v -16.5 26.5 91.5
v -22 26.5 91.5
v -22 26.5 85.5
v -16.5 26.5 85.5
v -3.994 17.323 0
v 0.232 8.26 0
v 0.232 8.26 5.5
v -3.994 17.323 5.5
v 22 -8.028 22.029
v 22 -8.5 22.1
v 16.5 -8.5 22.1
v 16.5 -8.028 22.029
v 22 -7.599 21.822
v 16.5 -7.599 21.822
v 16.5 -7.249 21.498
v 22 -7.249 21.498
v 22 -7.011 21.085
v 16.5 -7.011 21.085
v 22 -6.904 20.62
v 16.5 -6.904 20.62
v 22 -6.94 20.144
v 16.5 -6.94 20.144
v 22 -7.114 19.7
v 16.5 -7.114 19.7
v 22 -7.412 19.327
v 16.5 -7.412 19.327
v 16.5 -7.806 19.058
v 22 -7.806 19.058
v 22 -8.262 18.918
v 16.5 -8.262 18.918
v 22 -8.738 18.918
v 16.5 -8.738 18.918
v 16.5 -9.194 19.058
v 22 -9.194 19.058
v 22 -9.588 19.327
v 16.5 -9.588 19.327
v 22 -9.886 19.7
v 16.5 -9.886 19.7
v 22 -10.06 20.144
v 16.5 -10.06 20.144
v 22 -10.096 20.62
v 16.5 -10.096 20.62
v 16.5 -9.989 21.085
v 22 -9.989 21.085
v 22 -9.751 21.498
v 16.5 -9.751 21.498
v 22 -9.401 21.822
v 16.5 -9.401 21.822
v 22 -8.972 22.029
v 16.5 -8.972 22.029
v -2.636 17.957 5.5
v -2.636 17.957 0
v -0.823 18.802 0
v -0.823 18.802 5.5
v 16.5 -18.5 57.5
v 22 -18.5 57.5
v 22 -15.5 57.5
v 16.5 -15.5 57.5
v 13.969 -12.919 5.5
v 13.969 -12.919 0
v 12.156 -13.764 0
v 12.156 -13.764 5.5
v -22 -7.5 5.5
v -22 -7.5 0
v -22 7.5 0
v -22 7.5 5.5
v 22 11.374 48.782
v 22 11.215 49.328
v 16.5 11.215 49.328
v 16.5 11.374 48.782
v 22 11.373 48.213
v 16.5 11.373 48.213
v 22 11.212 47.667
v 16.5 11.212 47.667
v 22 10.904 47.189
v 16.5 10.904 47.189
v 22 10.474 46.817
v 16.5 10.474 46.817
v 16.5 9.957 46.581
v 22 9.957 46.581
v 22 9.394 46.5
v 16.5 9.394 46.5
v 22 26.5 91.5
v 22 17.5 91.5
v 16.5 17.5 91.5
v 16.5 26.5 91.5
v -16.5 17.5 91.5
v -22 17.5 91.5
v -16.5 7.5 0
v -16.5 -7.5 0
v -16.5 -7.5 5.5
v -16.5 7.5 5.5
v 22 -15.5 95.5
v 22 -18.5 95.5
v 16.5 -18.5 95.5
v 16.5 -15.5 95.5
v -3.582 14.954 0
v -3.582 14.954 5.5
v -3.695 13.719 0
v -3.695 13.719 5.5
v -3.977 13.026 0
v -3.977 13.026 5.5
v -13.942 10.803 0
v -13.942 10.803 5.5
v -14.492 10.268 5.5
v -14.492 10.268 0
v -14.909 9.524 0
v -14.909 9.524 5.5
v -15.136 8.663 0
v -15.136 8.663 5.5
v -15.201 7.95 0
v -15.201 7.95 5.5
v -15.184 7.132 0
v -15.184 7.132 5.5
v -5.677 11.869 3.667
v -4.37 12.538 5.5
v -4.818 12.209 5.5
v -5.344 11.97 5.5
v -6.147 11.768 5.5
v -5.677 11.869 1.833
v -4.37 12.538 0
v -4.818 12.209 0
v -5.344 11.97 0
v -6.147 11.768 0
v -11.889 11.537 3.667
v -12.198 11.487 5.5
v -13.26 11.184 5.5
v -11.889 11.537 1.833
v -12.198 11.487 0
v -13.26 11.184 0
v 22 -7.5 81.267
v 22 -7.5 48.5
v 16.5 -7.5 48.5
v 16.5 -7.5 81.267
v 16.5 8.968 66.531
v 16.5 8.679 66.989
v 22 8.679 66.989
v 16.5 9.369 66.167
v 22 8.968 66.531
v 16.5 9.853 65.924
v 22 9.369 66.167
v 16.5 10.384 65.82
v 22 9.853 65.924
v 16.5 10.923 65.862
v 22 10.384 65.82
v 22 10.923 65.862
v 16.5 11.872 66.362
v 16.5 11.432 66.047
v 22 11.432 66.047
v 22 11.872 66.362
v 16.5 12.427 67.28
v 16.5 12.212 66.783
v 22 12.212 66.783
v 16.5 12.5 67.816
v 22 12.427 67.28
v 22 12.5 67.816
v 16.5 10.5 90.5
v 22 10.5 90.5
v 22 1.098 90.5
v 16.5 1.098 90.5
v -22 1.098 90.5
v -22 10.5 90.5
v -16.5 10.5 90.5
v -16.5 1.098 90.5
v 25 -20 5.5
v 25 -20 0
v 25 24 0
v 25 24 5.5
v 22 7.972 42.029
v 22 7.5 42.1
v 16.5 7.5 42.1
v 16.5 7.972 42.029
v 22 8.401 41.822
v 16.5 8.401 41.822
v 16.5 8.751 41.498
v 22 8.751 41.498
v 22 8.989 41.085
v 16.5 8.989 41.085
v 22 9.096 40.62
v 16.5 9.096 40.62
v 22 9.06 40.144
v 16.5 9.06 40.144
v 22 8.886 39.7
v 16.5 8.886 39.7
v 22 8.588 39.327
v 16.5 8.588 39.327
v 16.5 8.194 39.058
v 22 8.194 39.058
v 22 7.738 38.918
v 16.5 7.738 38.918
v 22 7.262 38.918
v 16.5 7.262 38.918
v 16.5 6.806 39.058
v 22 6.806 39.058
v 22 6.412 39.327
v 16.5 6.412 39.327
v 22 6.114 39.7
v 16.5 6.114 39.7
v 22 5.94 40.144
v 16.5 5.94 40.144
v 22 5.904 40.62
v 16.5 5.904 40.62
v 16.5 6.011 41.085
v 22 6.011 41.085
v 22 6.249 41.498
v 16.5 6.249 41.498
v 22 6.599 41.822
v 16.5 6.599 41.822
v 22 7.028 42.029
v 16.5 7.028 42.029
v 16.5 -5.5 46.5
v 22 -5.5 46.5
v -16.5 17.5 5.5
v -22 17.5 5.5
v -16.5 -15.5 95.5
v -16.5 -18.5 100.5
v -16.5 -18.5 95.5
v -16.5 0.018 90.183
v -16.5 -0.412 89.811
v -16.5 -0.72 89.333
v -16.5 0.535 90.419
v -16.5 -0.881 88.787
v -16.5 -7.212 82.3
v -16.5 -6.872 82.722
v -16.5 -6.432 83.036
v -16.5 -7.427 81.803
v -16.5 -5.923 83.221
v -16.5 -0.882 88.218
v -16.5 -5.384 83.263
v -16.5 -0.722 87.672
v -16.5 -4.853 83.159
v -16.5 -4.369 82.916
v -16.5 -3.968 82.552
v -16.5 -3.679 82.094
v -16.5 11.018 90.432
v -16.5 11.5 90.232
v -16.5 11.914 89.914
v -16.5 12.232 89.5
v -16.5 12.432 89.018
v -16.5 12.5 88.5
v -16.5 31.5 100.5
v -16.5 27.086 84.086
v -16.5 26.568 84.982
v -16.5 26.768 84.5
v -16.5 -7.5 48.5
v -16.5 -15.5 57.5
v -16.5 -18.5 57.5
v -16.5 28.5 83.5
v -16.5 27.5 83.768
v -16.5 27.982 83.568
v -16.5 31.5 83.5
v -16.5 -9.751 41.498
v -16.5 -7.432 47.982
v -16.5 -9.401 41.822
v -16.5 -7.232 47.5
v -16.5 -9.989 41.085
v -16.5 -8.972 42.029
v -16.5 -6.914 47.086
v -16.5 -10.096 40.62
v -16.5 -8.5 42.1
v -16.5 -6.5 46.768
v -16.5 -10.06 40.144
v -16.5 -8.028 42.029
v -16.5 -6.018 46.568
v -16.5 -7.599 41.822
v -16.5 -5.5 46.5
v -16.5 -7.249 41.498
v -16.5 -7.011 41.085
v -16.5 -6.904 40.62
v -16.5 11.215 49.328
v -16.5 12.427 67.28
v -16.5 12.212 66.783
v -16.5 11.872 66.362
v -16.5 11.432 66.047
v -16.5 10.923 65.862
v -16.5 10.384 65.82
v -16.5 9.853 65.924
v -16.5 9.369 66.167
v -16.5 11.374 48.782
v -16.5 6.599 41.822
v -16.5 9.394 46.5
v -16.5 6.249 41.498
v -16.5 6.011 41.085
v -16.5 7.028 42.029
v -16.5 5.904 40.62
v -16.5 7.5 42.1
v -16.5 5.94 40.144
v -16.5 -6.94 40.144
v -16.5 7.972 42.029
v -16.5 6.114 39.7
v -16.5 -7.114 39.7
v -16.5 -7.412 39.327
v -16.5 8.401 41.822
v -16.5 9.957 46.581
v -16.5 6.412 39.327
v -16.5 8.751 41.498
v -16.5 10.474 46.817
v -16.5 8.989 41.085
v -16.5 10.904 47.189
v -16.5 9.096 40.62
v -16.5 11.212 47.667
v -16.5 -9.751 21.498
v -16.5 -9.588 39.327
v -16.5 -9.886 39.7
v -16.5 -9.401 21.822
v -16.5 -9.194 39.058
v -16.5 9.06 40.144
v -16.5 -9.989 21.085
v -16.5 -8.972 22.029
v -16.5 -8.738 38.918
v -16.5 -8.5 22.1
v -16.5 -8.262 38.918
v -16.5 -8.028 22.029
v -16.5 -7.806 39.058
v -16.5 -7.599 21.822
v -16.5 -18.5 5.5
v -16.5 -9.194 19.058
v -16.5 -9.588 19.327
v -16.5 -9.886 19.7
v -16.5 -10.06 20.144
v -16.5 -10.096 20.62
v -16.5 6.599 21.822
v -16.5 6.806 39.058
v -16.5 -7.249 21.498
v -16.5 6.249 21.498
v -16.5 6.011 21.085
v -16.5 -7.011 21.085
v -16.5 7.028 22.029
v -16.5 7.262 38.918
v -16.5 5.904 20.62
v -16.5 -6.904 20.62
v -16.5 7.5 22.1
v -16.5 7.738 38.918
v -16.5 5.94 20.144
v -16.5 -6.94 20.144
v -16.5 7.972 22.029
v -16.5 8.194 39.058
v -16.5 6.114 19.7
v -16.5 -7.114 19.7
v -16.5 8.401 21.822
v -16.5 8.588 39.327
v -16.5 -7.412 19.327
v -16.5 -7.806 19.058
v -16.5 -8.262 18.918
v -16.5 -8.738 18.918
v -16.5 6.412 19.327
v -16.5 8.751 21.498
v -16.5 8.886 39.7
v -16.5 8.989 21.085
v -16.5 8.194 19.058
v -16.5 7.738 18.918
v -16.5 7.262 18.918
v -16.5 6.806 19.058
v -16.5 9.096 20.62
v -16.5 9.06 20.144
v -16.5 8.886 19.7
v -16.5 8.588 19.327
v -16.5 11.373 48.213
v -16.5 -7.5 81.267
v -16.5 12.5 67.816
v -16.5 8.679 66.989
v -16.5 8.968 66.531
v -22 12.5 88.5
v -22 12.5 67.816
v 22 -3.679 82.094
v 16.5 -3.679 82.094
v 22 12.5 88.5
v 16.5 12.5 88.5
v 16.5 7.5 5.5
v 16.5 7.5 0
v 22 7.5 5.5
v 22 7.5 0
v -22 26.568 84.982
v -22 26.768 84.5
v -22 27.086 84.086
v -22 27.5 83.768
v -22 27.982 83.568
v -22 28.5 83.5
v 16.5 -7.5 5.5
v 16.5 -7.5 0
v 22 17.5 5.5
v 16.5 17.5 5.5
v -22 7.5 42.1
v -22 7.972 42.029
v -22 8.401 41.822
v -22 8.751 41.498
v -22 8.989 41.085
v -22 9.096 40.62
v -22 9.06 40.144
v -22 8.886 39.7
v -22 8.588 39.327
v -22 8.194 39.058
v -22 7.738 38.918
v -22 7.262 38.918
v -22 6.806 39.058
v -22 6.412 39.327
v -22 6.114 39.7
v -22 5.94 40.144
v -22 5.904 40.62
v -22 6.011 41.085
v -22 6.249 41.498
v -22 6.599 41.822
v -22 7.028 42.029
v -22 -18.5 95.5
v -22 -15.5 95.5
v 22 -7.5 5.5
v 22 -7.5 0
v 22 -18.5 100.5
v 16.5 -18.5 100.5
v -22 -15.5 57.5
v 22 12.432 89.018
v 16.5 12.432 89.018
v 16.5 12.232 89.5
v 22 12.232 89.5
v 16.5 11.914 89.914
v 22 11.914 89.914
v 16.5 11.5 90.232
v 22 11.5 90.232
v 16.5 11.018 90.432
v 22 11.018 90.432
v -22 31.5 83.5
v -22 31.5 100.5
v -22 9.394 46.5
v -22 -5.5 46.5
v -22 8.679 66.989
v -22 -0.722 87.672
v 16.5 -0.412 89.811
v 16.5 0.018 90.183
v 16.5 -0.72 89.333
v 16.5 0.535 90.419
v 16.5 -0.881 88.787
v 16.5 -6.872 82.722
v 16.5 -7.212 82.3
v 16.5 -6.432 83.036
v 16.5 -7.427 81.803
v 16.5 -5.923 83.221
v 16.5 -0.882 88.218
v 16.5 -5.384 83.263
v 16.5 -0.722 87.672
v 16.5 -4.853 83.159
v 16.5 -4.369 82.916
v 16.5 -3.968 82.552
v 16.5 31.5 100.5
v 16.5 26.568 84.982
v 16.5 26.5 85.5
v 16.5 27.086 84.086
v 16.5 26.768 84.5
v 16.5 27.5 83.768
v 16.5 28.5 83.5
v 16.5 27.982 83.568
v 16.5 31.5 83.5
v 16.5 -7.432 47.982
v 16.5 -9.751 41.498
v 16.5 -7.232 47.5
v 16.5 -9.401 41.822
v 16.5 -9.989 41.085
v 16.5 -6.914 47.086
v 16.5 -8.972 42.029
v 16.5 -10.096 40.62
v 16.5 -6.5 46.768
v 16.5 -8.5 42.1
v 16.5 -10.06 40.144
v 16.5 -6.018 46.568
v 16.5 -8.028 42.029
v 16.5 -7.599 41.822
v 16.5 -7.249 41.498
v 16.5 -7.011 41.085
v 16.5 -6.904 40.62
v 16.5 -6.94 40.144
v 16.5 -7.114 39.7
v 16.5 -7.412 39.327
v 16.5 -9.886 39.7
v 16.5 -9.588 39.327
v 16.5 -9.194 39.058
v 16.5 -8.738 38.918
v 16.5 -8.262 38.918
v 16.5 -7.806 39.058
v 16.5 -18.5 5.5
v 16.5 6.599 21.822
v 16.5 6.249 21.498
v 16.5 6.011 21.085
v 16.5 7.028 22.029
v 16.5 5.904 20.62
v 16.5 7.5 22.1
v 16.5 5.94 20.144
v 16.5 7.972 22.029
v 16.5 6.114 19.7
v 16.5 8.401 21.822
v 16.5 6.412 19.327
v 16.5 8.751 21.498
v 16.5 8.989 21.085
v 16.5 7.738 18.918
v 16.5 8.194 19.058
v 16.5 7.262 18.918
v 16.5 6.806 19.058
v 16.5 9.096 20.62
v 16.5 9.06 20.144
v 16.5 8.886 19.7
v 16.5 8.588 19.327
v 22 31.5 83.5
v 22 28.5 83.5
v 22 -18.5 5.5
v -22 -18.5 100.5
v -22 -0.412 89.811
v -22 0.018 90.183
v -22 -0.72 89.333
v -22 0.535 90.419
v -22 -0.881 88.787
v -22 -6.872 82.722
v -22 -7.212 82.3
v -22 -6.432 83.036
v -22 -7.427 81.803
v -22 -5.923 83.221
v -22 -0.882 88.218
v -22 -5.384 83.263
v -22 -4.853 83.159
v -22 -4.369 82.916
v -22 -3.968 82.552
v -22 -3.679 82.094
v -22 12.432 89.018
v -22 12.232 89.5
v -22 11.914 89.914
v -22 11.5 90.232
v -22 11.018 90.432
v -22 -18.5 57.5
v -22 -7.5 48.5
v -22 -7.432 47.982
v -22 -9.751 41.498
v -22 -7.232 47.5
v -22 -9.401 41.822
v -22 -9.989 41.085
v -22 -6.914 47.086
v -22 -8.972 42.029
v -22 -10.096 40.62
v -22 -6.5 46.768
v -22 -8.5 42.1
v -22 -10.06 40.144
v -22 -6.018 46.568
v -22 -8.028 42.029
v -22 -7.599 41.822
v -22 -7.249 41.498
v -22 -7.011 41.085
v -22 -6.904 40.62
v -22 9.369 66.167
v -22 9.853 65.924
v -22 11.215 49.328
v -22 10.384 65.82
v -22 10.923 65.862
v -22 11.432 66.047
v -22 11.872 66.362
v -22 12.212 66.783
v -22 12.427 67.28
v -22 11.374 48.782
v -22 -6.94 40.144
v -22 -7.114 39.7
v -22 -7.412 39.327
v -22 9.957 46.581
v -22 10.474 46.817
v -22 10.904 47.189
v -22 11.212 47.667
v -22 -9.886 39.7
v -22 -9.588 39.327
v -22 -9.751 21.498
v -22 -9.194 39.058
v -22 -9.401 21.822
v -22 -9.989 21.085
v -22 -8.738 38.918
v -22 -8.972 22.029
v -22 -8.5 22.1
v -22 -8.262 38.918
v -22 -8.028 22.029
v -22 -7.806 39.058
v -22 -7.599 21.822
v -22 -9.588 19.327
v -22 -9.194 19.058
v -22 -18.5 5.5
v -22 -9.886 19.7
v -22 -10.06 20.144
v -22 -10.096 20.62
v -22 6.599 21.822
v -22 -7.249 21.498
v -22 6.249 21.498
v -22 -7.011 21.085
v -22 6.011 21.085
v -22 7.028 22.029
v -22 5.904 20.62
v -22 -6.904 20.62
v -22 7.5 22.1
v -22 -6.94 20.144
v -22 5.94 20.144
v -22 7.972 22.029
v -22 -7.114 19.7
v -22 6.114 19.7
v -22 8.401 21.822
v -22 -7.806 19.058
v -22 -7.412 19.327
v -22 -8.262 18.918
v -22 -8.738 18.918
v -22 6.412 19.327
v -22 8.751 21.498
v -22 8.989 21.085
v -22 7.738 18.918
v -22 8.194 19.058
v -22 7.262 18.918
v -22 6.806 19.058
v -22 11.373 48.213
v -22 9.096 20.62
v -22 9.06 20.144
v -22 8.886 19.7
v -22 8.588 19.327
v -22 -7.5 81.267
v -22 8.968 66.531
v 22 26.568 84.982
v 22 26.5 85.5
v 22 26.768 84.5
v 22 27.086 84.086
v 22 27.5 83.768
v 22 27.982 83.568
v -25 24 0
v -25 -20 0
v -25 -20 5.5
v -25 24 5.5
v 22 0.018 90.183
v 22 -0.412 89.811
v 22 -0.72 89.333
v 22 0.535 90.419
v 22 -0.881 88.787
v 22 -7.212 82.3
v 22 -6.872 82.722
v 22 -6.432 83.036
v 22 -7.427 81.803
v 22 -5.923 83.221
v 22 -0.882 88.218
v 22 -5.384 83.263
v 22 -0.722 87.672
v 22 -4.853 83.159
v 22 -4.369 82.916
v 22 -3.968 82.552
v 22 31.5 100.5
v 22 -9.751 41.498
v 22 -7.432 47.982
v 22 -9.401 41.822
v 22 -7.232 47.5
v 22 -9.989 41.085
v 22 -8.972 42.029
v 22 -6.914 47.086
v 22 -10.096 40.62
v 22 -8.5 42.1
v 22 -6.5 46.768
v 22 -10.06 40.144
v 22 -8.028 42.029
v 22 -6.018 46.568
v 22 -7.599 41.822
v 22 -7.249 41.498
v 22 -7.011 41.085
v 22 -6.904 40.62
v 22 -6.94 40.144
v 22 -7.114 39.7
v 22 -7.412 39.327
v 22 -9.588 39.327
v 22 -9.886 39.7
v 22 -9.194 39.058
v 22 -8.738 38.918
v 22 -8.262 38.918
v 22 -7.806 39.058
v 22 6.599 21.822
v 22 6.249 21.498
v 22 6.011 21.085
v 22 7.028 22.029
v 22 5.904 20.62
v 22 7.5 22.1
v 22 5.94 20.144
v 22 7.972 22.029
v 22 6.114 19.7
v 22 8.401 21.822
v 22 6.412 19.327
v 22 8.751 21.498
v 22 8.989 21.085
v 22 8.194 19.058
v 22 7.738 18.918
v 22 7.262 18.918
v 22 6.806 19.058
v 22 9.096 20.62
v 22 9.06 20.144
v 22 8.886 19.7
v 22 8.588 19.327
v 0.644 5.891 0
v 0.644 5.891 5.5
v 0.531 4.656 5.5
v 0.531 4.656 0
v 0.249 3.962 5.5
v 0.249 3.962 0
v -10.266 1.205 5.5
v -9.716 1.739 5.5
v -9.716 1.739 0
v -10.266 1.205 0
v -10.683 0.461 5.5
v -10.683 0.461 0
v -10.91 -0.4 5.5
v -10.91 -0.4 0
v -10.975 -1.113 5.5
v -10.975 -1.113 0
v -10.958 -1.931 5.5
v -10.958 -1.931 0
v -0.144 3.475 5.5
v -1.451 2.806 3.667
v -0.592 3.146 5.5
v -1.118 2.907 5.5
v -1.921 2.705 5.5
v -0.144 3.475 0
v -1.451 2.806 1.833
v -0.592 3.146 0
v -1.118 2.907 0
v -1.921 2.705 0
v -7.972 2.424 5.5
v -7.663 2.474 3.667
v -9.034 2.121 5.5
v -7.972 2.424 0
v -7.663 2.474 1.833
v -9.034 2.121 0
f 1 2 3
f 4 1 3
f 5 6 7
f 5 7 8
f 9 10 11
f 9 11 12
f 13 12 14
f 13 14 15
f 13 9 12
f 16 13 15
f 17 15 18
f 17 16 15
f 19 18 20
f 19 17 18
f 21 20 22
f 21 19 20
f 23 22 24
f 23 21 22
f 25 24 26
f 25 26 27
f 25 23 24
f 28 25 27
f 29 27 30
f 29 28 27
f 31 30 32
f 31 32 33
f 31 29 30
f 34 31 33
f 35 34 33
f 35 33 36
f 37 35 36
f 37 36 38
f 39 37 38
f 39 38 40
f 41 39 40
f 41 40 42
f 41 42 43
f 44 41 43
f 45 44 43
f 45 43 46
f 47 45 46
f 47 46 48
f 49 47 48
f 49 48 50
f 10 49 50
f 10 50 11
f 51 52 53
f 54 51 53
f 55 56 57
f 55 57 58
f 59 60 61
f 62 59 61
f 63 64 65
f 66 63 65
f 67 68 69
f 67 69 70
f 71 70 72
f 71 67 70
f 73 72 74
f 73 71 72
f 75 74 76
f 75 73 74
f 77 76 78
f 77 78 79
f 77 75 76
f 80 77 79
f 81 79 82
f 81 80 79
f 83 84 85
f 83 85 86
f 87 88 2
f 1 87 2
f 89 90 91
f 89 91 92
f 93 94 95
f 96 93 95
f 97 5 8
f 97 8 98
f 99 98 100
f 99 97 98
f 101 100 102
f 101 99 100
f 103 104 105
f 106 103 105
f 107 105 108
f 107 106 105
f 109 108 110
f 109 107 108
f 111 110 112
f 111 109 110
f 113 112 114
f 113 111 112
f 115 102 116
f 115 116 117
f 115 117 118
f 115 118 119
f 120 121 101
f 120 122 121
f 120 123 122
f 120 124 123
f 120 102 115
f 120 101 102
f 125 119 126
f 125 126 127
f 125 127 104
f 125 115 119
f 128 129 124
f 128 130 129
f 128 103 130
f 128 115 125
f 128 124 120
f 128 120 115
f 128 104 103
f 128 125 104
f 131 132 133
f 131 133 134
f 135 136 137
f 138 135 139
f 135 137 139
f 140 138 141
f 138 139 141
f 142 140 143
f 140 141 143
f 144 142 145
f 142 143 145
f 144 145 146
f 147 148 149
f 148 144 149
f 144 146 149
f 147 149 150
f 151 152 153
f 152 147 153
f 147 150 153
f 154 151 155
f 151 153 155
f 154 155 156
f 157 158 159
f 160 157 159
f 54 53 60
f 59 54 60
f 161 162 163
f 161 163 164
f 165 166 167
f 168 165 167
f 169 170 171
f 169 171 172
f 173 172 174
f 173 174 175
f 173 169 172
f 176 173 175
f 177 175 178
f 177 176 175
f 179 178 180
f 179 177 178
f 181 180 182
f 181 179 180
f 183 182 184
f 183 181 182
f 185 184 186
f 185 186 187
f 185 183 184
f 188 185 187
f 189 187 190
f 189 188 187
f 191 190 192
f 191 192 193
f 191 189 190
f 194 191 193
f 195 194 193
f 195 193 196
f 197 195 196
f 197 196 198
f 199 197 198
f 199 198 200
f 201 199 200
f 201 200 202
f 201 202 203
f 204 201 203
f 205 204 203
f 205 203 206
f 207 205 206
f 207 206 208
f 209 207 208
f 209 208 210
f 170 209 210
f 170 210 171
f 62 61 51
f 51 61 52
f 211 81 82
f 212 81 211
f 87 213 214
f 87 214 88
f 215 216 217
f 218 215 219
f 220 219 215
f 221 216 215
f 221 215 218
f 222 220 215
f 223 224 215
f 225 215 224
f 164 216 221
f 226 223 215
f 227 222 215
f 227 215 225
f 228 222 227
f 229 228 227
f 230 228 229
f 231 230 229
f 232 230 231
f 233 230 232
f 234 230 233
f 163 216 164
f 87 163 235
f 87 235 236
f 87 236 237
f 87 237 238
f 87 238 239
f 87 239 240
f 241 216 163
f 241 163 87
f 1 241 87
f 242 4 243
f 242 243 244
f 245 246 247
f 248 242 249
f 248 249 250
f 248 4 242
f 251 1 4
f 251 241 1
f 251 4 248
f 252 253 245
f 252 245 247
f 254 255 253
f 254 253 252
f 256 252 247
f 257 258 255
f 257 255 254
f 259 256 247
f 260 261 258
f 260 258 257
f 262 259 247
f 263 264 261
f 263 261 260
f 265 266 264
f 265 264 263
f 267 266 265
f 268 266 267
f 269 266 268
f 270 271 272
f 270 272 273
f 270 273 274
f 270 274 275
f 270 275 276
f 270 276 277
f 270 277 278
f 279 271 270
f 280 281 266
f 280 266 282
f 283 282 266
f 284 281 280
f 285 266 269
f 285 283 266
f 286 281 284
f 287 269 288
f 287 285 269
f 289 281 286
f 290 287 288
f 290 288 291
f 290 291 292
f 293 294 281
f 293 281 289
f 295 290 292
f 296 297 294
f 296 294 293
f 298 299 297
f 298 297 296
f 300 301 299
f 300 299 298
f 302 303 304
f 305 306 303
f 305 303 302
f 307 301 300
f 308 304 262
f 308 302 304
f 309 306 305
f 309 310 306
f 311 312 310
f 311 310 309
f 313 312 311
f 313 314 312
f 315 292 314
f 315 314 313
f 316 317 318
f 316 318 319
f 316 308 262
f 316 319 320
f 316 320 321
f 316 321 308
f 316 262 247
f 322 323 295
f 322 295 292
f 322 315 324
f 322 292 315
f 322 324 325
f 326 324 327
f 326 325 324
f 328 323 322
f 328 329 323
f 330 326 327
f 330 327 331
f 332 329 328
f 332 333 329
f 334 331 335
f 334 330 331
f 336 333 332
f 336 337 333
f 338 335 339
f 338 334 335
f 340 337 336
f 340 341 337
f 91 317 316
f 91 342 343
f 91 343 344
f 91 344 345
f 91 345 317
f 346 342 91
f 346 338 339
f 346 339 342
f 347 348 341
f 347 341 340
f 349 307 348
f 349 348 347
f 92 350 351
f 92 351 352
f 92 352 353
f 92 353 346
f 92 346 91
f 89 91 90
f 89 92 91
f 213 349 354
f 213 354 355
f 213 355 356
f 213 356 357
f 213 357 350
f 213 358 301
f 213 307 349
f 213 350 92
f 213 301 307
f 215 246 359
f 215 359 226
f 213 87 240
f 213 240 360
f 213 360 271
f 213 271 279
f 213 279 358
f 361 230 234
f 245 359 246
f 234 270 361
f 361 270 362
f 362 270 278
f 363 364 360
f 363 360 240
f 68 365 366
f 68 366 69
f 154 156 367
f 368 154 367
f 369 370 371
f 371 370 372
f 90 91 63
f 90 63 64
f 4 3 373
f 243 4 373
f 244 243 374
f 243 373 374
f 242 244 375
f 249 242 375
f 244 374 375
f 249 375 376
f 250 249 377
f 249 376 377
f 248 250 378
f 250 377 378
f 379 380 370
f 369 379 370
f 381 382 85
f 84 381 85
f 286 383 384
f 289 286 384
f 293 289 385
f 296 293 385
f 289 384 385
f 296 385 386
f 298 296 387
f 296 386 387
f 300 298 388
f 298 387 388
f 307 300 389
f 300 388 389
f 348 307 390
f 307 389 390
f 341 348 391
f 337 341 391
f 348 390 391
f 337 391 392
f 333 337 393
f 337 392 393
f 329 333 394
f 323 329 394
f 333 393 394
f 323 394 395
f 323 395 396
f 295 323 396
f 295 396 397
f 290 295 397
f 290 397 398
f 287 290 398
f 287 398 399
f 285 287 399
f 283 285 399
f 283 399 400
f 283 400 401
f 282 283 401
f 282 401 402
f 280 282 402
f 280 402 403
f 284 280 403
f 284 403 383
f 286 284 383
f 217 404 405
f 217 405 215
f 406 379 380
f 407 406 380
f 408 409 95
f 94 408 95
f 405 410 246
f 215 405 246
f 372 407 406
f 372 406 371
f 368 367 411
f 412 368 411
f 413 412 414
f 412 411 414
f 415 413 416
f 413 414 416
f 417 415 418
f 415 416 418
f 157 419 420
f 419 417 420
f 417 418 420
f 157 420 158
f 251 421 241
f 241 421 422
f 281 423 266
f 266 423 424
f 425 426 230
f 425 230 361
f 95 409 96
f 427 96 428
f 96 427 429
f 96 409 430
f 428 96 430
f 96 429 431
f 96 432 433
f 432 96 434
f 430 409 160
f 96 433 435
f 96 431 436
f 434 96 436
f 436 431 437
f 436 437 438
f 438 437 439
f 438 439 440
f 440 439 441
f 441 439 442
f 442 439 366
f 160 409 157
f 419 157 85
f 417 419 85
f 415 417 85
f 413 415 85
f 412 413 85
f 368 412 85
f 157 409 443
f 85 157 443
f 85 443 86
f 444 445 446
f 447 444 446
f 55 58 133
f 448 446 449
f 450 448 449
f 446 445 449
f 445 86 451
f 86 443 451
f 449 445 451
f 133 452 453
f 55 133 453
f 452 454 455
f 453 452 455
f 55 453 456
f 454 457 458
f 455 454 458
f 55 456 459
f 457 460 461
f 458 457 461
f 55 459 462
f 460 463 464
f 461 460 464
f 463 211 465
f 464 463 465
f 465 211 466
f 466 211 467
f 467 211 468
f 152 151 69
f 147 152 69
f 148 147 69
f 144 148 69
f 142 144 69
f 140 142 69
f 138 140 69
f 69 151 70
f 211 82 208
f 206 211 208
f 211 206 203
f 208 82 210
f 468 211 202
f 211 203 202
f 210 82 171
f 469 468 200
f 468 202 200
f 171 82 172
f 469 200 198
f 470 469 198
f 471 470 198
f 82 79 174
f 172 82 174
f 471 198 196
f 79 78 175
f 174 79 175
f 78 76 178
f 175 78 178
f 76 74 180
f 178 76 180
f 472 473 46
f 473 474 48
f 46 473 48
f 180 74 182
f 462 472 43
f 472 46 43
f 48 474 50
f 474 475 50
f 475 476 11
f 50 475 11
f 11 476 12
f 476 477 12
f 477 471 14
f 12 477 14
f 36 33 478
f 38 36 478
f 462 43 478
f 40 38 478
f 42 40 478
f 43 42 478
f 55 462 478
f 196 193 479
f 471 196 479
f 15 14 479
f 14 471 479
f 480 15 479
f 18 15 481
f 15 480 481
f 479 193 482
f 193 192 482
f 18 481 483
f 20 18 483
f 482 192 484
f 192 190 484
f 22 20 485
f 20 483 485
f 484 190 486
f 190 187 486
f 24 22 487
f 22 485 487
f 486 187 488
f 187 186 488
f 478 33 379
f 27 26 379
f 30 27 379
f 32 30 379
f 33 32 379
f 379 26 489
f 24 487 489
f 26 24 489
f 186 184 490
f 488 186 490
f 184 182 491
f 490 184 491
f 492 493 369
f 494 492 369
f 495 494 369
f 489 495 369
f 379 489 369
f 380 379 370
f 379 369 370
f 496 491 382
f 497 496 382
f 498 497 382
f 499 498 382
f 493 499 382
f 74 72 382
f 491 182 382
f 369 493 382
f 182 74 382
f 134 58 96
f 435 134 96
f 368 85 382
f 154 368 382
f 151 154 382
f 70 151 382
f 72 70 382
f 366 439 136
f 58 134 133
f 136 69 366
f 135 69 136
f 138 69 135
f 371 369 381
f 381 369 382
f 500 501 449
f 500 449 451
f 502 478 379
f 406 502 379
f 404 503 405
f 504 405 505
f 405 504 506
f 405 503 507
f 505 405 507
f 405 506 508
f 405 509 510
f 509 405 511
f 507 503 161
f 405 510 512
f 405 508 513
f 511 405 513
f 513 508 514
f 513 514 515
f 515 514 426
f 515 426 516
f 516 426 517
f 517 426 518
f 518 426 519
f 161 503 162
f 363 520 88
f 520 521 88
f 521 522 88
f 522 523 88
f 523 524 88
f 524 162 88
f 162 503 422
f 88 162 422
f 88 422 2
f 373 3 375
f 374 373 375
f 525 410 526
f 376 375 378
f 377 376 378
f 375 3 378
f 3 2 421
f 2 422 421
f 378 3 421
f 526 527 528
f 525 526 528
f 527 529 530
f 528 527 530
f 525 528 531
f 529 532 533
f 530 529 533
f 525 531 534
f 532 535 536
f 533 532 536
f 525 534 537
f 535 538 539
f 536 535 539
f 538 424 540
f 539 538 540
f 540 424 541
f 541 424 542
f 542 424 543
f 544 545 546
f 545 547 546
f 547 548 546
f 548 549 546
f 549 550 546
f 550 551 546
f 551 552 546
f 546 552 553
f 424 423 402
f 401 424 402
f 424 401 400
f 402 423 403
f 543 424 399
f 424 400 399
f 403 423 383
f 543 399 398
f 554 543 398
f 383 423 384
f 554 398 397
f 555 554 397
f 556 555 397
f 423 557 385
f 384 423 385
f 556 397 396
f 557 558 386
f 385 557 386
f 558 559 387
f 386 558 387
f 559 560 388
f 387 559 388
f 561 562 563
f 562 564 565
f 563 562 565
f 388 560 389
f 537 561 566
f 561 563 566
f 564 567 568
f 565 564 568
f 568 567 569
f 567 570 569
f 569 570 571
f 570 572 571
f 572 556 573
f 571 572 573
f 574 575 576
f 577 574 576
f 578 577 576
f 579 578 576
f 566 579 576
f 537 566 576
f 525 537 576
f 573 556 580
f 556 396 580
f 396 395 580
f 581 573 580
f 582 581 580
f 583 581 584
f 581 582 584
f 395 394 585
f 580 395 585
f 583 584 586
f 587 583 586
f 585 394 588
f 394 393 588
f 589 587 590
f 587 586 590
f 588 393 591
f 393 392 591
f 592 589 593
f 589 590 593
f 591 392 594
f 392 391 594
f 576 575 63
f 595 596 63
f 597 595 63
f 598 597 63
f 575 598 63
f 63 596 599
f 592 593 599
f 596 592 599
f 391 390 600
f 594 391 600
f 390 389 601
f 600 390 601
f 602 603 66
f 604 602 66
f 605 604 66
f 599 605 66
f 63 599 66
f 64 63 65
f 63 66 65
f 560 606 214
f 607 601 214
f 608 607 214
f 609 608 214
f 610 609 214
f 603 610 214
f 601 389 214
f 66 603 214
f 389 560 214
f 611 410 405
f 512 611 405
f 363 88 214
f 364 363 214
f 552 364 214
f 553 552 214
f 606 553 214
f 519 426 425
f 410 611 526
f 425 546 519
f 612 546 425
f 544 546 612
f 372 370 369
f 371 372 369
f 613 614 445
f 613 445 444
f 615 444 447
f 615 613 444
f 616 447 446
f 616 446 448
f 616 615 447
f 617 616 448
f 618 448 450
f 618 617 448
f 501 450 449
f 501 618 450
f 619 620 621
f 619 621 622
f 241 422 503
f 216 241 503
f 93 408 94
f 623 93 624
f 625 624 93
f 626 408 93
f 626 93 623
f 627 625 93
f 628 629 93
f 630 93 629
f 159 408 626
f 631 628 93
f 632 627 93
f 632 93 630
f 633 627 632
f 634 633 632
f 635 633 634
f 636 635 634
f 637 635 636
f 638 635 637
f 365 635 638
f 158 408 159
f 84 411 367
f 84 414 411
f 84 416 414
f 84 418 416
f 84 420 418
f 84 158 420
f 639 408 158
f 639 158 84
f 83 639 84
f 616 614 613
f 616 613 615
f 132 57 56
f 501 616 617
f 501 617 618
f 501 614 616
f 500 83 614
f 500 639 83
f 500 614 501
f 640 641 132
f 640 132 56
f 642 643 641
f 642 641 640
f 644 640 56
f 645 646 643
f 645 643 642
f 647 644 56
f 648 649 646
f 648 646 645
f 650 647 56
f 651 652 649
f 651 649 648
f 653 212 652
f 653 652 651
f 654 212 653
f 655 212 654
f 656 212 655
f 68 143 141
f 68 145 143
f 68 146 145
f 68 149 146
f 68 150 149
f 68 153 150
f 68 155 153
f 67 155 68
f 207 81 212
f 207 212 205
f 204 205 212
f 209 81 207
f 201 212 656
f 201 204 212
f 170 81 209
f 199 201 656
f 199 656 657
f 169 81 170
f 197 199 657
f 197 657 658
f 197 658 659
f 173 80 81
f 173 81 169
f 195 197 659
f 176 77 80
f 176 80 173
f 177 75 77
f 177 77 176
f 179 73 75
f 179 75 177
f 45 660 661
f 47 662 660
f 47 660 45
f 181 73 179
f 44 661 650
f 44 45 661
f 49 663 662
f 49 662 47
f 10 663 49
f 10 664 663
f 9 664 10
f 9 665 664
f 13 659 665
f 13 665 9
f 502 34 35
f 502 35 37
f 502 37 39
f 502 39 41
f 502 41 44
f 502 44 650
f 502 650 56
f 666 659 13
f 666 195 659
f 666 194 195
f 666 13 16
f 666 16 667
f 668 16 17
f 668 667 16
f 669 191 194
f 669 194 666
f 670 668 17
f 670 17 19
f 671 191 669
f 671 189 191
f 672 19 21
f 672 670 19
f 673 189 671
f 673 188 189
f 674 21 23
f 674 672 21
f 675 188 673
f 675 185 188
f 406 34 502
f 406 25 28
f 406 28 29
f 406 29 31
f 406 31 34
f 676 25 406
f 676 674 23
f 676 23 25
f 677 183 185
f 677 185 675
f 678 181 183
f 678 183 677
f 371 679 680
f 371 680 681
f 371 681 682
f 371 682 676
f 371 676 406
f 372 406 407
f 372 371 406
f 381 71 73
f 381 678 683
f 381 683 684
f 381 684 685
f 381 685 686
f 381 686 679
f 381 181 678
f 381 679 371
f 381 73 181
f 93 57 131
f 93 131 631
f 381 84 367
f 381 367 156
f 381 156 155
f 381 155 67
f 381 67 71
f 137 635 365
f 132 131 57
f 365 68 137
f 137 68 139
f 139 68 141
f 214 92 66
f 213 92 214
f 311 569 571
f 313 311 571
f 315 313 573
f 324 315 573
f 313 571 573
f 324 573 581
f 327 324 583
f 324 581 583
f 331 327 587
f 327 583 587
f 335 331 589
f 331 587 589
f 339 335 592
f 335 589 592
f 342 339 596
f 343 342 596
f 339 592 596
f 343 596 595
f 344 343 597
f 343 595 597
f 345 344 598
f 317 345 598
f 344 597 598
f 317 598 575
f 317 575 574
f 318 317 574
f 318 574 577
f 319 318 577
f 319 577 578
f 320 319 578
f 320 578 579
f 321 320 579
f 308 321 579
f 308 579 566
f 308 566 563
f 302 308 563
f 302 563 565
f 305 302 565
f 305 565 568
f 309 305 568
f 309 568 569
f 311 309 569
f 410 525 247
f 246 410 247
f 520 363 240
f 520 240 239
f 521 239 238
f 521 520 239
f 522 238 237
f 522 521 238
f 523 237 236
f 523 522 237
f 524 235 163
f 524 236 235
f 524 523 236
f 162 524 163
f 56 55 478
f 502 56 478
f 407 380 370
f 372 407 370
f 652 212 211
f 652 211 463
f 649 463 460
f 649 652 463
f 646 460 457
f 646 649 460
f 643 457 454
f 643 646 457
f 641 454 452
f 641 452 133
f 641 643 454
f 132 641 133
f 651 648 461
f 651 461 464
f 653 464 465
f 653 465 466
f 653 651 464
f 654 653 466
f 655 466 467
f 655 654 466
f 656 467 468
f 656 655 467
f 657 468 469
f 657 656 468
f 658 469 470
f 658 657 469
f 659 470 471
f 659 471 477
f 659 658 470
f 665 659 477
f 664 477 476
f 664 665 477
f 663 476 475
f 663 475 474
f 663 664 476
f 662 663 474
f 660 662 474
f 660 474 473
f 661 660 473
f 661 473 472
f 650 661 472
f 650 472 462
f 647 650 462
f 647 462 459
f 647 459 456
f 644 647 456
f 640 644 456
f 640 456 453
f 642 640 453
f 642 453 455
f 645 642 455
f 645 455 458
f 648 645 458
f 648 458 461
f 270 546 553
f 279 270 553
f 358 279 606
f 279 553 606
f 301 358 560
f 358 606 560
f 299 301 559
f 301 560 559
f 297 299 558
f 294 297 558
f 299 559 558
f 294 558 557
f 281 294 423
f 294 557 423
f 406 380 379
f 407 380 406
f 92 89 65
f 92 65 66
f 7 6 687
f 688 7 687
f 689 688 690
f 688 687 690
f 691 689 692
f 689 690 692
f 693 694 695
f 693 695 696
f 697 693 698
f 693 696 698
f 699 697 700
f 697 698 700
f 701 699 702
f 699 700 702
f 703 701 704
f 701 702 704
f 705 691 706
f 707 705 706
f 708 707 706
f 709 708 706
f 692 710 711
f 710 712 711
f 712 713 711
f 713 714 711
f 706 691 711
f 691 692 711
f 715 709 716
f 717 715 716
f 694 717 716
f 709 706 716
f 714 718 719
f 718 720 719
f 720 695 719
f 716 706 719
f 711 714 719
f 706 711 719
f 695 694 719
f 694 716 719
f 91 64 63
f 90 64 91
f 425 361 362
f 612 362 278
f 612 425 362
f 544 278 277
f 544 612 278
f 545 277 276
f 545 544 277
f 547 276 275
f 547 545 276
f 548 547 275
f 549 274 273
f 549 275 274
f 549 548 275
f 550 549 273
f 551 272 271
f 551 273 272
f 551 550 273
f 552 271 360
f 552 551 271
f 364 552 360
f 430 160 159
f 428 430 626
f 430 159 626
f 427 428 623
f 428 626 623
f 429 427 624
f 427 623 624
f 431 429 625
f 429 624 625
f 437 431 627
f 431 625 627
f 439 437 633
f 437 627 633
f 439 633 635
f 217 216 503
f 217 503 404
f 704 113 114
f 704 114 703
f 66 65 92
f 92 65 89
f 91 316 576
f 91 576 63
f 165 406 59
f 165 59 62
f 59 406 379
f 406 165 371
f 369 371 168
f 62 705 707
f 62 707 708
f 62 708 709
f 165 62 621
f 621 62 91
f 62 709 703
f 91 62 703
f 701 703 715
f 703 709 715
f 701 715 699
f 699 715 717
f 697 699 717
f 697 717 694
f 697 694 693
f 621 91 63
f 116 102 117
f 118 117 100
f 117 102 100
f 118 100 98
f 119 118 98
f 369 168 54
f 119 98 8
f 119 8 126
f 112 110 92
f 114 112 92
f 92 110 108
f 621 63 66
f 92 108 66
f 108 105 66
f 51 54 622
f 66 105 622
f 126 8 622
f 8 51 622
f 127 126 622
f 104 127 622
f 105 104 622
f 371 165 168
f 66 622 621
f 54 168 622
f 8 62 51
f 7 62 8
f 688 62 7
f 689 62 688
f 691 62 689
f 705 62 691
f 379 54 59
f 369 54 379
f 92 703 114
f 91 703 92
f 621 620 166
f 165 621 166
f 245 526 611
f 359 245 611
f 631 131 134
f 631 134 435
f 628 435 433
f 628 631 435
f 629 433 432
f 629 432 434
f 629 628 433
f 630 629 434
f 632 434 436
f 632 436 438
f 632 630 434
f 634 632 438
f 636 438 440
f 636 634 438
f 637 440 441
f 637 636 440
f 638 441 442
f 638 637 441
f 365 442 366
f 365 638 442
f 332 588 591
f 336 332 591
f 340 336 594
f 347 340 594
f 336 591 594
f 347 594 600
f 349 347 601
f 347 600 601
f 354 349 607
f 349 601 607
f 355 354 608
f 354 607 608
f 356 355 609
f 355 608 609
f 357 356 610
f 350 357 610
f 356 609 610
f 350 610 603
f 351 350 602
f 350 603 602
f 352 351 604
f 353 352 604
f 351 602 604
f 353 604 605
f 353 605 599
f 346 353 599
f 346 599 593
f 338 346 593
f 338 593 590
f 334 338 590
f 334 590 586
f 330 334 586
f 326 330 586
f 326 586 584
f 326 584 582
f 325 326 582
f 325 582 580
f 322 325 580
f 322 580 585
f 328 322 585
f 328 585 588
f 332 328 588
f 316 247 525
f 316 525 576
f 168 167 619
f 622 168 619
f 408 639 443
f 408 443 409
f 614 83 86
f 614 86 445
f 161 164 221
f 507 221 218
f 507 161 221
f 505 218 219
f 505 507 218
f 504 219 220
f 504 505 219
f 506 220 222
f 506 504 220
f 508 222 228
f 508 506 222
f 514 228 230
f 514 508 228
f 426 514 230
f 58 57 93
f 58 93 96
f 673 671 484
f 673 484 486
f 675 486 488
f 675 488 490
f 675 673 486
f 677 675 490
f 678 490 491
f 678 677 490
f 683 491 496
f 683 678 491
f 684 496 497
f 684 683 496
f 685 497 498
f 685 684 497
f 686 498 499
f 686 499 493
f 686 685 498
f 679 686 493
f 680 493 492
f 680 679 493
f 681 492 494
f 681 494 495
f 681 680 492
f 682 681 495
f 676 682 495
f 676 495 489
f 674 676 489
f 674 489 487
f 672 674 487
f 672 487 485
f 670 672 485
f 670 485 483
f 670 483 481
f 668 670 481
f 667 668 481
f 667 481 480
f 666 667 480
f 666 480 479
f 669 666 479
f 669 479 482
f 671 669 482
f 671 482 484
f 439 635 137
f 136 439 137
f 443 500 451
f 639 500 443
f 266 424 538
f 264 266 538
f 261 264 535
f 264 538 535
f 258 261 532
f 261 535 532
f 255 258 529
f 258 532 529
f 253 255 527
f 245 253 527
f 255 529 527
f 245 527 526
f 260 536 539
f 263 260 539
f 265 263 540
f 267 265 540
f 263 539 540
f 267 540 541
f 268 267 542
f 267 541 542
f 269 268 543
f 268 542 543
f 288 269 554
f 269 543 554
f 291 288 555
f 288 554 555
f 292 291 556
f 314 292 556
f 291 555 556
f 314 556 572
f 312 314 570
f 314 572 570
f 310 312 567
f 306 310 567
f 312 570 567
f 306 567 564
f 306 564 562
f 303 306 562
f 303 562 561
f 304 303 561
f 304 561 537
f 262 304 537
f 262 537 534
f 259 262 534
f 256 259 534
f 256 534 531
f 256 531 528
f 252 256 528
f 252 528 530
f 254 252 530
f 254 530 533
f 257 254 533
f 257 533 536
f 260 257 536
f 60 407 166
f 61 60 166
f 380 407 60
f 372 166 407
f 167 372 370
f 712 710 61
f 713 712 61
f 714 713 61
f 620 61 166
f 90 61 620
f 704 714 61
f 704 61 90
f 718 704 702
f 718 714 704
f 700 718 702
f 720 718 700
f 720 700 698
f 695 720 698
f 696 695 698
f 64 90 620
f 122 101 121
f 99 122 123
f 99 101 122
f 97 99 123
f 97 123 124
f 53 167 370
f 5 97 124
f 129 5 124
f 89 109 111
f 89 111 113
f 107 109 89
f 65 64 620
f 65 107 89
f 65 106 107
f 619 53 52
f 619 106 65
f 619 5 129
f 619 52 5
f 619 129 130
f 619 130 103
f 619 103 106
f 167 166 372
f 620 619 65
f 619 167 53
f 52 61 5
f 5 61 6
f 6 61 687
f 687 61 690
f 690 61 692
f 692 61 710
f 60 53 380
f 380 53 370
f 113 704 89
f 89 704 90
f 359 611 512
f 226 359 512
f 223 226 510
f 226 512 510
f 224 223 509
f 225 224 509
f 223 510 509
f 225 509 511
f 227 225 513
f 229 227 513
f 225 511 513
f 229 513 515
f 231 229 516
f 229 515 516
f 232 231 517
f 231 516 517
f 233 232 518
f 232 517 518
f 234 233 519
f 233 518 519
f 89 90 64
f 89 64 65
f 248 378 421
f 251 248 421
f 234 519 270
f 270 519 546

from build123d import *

# Parameters (mm, degrees)
SKETCH_1_W          = 50
SKETCH_1_H          = 40
SKETCH_1_W_2        = 5.5
SKETCH_1_H_2        = 15
EXTRUDE_1_DEPTH     = 5.5
EXTRUDE_2_DEPTH     = 5.5
SKETCH_8_W          = 5.5
SKETCH_8_H          = 38
CUT_EXTRUDE_2_DEPTH = 3
SKETCH_19_R         = 1.6
CUT_EXTRUDE_6_DEPTH = 48.0000001
EXTRUDE_3_DEPTH     = 5.5
SKETCH_21_W         = 50
SKETCH_21_H         = 4
EXTRUDE_4_DEPTH     = 5.5


with BuildPart() as part:
    # ｽｹｯﾁ1 → ﾎﾞｽ - 押し出し1 (new body)
    with BuildSketch(Plane.XY):
        Rectangle(SKETCH_1_W, SKETCH_1_H)
        with Locations((-19.25, 0)):
            Rectangle(SKETCH_1_W_2, SKETCH_1_H_2, mode=Mode.SUBTRACT)
        with Locations((19.25, 0)):
            Rectangle(SKETCH_1_W_2, SKETCH_1_H_2, mode=Mode.SUBTRACT)
        with BuildLine():
            Line((-15.184159493, 7.131957878), (-10.957976876, -1.931119992))
            add(Edge.make_bspline(
                [(0.232480079, 8.26018902), (3.294805184, -2.820777733), (-11.603430093, 7.575468843), (-10.957976876, -1.931119992)],
                knots=[0, 0, 0, 0, 1, 1, 1, 1], degree=3))
            Line((0.232480079, 8.26018902), (-3.993702538, 17.323266891))
            add(Edge.make_bspline(
                [(-3.993702538, 17.323266891), (-0.931377433, 6.242300138), (-15.829612711, 16.638546714), (-15.184159493, 7.131957878)],
                knots=[0, 0, 0, 0, 1, 1, 1, 1], degree=3))
        make_face(mode=Mode.SUBTRACT)
        Polygon((-2.635695691, 17.956515883), (-0.823080117, 18.801752407), (13.968559044, -12.91902014), (12.155943469, -13.764256663), align=None, mode=Mode.SUBTRACT)
    extrude(amount=EXTRUDE_1_DEPTH)

    # ｽｹｯﾁ21 → ﾎﾞｽ - 押し出し4 (add)
    with BuildSketch(Plane(origin=(0, 0, 0), x_dir=(-1, 0, 0), z_dir=(0, 0, -1))):
        with Locations((0, 22)):
            Rectangle(SKETCH_21_W, SKETCH_21_H)
    extrude(amount=-EXTRUDE_4_DEPTH)


with BuildPart() as body_2:
    # ｽｹｯﾁ2 → ﾎﾞｽ - 押し出し2 (new body)
    with BuildSketch(Plane.ZY.offset(16.5)):
        Polygon((0, 7.5), (5.5, 7.5), (5.5, 17.5), (100.5, 17.5), (100.5, -18.5), (5.5, -18.5), (5.5, -7.5), (0, -7.5), align=None)
    extrude(amount=EXTRUDE_2_DEPTH)

    # ｽｹｯﾁ8 → ｶｯﾄ - 押し出し2 (cut)
    with BuildSketch(Plane.XZ.offset(18.5)):
        with Locations((-19.25, 76.5)):
            Rectangle(SKETCH_8_W, SKETCH_8_H)
    extrude(amount=-CUT_EXTRUDE_2_DEPTH, mode=Mode.SUBTRACT)

    # ｽｹｯﾁ19 → ｶｯﾄ - 押し出し6 (cut, through all)
    with BuildSketch(Plane.ZY.offset(22)):
        with Locations((20.5, 7.5)):
            Circle(SKETCH_19_R)
        with Locations((20.5, -8.5)):
            Circle(SKETCH_19_R)
        with Locations((40.5, -8.5)):
            Circle(SKETCH_19_R)
        with Locations((40.5, 7.5)):
            Circle(SKETCH_19_R)
        with BuildLine():
            Line((46.5, 9.393991641), (46.5, -5.5))
            ThreePointArc((46.5, -5.5), (47.085786438, -6.914213562), (48.5, -7.5))
            Line((48.5, -7.5), (81.266781611, -7.5))
            ThreePointArc((81.266781611, -7.5), (83.221451136, -5.923399392), (82.094387499, -3.679267045))
            Line((82.094387499, -3.679267045), (49.327605889, 11.214724596))
            ThreePointArc((49.327605889, 11.214724596), (47.417228505, 11.075540299), (46.5, 9.393991641))
        make_face()
        with BuildLine():
            Line((67.816264363, 12.5), (88.5, 12.5))
            ThreePointArc((88.5, 12.5), (89.914213562, 11.914213562), (90.5, 10.5))
            Line((90.5, 10.5), (90.5, 1.098301983))
            ThreePointArc((90.5, 1.098301983), (89.582771495, -0.583246675), (87.672394111, -0.722430972))
            Line((87.672394111, -0.722430972), (66.988658474, 8.679267045))
            ThreePointArc((66.988658474, 8.679267045), (65.861594837, 10.923399392), (67.816264363, 12.5))
        make_face()
    extrude(amount=-CUT_EXTRUDE_6_DEPTH, mode=Mode.SUBTRACT)

    # ｽｹｯﾁ20 → ﾎﾞｽ - 押し出し3 (add)
    with BuildSketch(Plane.ZY.offset(22)):
        with BuildLine():
            Line((91.5, 17.5), (91.5, 26.5))
            Line((91.5, 26.5), (85.5, 26.5))
            ThreePointArc((85.5, 26.5), (84.085786438, 27.085786438), (83.5, 28.5))
            Line((83.5, 28.5), (83.5, 31.5))
            Line((83.5, 31.5), (100.5, 31.5))
            Line((100.5, 31.5), (100.5, 17.5))
            Line((100.5, 17.5), (91.5, 17.5))
        make_face()
    extrude(amount=-EXTRUDE_3_DEPTH)


with BuildPart() as body_3:
    # ﾐﾗｰ1: mirrored copy
    add(body_2.part.mirror(Plane(origin=(0, 0, 0), x_dir=(0, 0, 1), z_dir=(1, 0, 0))))


solid = Compound([part.part, body_2.part, body_3.part])
